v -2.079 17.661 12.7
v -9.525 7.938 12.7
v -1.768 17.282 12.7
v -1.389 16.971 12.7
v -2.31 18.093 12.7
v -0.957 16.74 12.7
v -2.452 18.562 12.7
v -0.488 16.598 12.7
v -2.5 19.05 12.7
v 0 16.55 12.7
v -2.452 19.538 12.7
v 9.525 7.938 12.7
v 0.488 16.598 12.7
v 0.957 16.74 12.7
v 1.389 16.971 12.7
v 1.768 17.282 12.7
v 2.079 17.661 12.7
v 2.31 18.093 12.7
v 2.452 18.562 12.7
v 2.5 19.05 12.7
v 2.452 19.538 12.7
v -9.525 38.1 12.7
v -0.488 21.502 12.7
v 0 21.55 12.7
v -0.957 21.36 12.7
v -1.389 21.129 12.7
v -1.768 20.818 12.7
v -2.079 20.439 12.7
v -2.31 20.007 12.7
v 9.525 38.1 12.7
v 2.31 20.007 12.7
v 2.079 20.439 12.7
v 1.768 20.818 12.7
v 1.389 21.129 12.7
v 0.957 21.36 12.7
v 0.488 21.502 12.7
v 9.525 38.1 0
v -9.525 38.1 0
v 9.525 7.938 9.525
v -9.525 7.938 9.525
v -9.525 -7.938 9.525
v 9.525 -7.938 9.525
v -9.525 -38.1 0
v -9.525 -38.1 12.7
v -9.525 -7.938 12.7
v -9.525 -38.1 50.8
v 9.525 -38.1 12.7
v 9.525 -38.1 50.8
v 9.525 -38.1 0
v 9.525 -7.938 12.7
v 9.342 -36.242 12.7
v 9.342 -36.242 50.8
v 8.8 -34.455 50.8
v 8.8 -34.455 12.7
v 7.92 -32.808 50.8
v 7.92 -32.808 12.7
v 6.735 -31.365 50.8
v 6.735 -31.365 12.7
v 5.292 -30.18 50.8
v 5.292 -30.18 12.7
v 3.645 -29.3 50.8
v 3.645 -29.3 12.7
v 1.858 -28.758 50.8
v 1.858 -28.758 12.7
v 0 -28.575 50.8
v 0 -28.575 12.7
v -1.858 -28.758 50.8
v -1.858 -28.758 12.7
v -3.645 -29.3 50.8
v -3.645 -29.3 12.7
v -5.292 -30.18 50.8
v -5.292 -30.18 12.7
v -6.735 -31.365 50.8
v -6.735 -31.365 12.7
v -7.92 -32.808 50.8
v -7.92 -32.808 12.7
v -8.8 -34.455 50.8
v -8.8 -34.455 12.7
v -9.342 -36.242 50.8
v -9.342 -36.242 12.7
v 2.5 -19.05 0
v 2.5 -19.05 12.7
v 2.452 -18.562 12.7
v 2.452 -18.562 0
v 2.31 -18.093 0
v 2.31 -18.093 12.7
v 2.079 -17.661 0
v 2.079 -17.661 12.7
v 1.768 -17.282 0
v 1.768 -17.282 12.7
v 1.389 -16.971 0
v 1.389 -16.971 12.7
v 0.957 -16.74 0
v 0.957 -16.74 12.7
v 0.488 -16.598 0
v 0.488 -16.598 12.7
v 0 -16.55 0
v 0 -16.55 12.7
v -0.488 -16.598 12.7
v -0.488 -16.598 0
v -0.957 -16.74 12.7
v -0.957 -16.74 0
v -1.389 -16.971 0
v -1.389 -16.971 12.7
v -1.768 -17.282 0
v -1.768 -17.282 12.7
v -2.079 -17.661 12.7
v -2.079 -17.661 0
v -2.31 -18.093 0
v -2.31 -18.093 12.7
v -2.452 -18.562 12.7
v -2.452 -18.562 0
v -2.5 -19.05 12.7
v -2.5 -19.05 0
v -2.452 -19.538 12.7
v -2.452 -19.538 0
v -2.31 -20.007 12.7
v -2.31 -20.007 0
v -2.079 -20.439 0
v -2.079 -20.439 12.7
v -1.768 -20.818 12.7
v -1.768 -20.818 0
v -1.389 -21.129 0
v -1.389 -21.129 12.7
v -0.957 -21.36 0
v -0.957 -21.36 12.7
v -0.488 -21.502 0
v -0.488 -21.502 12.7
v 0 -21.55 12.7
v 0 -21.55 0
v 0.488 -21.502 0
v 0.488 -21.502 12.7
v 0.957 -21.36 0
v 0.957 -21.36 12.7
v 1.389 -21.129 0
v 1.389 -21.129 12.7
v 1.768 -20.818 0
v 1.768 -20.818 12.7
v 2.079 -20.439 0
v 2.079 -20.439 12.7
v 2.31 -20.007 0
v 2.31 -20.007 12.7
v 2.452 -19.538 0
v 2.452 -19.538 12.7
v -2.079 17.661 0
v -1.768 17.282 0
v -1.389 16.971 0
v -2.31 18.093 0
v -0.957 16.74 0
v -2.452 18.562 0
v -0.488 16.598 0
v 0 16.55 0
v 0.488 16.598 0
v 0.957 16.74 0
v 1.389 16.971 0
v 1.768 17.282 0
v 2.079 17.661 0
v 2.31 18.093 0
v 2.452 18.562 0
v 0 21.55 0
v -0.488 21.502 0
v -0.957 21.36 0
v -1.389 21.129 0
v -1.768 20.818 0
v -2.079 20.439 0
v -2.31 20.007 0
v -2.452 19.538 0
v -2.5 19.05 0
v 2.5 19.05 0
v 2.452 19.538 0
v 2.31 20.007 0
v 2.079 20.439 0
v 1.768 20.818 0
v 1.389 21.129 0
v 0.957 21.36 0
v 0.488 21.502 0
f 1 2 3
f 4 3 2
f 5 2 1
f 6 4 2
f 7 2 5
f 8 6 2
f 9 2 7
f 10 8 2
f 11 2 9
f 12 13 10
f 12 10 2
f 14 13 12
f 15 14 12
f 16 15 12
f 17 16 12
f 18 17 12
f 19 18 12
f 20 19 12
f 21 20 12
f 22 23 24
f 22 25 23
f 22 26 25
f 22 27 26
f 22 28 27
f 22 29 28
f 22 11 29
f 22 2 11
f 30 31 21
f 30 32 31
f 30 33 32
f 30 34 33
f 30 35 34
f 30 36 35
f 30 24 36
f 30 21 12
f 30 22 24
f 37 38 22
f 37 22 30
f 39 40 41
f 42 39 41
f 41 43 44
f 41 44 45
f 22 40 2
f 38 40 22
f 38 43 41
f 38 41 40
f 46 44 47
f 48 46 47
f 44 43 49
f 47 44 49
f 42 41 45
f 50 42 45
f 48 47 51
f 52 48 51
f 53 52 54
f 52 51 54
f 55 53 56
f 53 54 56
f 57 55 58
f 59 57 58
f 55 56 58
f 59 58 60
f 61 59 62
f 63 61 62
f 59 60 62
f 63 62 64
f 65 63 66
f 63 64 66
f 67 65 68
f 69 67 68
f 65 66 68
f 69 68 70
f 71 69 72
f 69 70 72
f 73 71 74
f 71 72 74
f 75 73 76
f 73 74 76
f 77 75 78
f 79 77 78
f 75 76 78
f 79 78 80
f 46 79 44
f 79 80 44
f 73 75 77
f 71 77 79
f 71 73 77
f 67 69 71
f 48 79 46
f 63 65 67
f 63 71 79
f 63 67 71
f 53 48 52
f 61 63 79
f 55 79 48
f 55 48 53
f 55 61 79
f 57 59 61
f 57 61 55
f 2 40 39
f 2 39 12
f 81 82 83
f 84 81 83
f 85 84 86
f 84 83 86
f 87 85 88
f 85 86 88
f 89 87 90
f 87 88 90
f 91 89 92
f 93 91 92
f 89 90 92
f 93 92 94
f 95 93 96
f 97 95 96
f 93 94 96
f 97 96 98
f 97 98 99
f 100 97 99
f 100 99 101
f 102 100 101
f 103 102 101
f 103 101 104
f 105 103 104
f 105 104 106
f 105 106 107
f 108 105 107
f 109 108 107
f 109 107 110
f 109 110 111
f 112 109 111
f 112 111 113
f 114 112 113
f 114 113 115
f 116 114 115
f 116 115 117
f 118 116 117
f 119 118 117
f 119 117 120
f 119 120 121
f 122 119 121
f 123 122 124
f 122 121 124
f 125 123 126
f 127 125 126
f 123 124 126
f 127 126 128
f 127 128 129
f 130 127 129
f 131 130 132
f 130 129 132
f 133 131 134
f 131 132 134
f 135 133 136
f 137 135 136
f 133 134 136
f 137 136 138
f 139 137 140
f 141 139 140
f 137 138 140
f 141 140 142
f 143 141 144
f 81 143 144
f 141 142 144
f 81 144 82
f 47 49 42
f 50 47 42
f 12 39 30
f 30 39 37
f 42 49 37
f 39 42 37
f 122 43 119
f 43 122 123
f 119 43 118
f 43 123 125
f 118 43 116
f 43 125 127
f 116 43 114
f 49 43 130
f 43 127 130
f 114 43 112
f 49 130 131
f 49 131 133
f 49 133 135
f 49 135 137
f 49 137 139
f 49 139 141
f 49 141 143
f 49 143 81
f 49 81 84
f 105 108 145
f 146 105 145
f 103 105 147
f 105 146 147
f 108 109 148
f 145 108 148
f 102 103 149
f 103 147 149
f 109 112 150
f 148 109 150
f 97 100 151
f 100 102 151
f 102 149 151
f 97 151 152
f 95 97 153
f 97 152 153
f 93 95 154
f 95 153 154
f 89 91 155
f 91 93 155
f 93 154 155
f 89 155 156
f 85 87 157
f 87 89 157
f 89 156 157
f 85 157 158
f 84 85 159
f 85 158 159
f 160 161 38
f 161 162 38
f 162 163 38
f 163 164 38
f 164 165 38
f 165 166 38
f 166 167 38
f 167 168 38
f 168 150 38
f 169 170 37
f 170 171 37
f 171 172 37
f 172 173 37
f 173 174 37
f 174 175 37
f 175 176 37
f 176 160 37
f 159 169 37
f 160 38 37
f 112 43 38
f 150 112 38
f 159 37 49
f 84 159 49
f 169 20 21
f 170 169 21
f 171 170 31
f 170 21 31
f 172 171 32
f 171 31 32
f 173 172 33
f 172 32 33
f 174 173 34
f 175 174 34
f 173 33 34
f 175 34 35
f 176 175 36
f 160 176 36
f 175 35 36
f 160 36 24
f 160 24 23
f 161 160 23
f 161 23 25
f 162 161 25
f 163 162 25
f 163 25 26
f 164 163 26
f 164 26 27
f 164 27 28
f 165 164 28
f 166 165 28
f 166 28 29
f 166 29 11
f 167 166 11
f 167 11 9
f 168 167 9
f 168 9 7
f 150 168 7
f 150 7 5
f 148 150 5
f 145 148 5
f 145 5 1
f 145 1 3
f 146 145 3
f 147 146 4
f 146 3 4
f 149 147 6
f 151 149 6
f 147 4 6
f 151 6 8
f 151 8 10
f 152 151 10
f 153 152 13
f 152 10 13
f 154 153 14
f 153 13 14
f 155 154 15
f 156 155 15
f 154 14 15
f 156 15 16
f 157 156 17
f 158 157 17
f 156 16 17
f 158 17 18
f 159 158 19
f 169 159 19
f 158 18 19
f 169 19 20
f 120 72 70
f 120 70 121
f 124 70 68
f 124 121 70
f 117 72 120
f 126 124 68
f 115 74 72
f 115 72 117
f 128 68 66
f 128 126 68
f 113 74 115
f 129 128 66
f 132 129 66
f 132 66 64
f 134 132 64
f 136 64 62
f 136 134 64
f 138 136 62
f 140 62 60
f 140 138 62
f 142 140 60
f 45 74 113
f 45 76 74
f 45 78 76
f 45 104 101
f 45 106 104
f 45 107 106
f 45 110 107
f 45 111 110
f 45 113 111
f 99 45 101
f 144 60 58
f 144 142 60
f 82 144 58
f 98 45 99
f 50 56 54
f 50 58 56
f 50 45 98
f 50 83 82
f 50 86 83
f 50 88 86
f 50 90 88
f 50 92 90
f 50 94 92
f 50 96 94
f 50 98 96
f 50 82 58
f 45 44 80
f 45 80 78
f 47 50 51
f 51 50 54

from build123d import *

# Parameters (mm, degrees)
F0_W     = 19.05
F0_H     = 76.2
F1_DEPTH = 12.7
F3_DEPTH = 38.1
F4_W     = 15.875
F4_H     = 6.35
F5_DEPTH = 19.051
F6_R     = 2.5
F7_DEPTH = 12.701


with BuildPart() as f1:
    # F0 (on Top) → F1 (new body)
    with BuildSketch(Plane.XY):
        Rectangle(F0_W, F0_H)
    extrude(amount=F1_DEPTH)

    # F2 (on face) → F3 (join)
    with BuildSketch(Plane.XY.offset(12.7)):
        with BuildLine():
            Line((-9.525, -38.1), (9.525, -38.1))
            ThreePointArc((9.525, -38.1), (0, -28.575), (-9.525, -38.1))
        make_face()
    extrude(amount=F3_DEPTH)

    # F4 (on face) → F5 (cut, through all)
    with BuildSketch(Plane(origin=(-9.525, 0, 0), x_dir=(0, -1, 0), z_dir=(-1, 0, 0))):
        with Locations((0, 12.7)):
            Rectangle(F4_W, F4_H)
    extrude(amount=-F5_DEPTH, mode=Mode.SUBTRACT)

    # F6 (on face) → F7 (cut, through all)
    with BuildSketch(Plane.XY.offset(12.7)):
        with Locations((0, -19.05)):
            Circle(F6_R)
        with Locations((0, 19.05)):
            Circle(F6_R)
    extrude(amount=-F7_DEPTH, mode=Mode.SUBTRACT)


solid = f1.part
